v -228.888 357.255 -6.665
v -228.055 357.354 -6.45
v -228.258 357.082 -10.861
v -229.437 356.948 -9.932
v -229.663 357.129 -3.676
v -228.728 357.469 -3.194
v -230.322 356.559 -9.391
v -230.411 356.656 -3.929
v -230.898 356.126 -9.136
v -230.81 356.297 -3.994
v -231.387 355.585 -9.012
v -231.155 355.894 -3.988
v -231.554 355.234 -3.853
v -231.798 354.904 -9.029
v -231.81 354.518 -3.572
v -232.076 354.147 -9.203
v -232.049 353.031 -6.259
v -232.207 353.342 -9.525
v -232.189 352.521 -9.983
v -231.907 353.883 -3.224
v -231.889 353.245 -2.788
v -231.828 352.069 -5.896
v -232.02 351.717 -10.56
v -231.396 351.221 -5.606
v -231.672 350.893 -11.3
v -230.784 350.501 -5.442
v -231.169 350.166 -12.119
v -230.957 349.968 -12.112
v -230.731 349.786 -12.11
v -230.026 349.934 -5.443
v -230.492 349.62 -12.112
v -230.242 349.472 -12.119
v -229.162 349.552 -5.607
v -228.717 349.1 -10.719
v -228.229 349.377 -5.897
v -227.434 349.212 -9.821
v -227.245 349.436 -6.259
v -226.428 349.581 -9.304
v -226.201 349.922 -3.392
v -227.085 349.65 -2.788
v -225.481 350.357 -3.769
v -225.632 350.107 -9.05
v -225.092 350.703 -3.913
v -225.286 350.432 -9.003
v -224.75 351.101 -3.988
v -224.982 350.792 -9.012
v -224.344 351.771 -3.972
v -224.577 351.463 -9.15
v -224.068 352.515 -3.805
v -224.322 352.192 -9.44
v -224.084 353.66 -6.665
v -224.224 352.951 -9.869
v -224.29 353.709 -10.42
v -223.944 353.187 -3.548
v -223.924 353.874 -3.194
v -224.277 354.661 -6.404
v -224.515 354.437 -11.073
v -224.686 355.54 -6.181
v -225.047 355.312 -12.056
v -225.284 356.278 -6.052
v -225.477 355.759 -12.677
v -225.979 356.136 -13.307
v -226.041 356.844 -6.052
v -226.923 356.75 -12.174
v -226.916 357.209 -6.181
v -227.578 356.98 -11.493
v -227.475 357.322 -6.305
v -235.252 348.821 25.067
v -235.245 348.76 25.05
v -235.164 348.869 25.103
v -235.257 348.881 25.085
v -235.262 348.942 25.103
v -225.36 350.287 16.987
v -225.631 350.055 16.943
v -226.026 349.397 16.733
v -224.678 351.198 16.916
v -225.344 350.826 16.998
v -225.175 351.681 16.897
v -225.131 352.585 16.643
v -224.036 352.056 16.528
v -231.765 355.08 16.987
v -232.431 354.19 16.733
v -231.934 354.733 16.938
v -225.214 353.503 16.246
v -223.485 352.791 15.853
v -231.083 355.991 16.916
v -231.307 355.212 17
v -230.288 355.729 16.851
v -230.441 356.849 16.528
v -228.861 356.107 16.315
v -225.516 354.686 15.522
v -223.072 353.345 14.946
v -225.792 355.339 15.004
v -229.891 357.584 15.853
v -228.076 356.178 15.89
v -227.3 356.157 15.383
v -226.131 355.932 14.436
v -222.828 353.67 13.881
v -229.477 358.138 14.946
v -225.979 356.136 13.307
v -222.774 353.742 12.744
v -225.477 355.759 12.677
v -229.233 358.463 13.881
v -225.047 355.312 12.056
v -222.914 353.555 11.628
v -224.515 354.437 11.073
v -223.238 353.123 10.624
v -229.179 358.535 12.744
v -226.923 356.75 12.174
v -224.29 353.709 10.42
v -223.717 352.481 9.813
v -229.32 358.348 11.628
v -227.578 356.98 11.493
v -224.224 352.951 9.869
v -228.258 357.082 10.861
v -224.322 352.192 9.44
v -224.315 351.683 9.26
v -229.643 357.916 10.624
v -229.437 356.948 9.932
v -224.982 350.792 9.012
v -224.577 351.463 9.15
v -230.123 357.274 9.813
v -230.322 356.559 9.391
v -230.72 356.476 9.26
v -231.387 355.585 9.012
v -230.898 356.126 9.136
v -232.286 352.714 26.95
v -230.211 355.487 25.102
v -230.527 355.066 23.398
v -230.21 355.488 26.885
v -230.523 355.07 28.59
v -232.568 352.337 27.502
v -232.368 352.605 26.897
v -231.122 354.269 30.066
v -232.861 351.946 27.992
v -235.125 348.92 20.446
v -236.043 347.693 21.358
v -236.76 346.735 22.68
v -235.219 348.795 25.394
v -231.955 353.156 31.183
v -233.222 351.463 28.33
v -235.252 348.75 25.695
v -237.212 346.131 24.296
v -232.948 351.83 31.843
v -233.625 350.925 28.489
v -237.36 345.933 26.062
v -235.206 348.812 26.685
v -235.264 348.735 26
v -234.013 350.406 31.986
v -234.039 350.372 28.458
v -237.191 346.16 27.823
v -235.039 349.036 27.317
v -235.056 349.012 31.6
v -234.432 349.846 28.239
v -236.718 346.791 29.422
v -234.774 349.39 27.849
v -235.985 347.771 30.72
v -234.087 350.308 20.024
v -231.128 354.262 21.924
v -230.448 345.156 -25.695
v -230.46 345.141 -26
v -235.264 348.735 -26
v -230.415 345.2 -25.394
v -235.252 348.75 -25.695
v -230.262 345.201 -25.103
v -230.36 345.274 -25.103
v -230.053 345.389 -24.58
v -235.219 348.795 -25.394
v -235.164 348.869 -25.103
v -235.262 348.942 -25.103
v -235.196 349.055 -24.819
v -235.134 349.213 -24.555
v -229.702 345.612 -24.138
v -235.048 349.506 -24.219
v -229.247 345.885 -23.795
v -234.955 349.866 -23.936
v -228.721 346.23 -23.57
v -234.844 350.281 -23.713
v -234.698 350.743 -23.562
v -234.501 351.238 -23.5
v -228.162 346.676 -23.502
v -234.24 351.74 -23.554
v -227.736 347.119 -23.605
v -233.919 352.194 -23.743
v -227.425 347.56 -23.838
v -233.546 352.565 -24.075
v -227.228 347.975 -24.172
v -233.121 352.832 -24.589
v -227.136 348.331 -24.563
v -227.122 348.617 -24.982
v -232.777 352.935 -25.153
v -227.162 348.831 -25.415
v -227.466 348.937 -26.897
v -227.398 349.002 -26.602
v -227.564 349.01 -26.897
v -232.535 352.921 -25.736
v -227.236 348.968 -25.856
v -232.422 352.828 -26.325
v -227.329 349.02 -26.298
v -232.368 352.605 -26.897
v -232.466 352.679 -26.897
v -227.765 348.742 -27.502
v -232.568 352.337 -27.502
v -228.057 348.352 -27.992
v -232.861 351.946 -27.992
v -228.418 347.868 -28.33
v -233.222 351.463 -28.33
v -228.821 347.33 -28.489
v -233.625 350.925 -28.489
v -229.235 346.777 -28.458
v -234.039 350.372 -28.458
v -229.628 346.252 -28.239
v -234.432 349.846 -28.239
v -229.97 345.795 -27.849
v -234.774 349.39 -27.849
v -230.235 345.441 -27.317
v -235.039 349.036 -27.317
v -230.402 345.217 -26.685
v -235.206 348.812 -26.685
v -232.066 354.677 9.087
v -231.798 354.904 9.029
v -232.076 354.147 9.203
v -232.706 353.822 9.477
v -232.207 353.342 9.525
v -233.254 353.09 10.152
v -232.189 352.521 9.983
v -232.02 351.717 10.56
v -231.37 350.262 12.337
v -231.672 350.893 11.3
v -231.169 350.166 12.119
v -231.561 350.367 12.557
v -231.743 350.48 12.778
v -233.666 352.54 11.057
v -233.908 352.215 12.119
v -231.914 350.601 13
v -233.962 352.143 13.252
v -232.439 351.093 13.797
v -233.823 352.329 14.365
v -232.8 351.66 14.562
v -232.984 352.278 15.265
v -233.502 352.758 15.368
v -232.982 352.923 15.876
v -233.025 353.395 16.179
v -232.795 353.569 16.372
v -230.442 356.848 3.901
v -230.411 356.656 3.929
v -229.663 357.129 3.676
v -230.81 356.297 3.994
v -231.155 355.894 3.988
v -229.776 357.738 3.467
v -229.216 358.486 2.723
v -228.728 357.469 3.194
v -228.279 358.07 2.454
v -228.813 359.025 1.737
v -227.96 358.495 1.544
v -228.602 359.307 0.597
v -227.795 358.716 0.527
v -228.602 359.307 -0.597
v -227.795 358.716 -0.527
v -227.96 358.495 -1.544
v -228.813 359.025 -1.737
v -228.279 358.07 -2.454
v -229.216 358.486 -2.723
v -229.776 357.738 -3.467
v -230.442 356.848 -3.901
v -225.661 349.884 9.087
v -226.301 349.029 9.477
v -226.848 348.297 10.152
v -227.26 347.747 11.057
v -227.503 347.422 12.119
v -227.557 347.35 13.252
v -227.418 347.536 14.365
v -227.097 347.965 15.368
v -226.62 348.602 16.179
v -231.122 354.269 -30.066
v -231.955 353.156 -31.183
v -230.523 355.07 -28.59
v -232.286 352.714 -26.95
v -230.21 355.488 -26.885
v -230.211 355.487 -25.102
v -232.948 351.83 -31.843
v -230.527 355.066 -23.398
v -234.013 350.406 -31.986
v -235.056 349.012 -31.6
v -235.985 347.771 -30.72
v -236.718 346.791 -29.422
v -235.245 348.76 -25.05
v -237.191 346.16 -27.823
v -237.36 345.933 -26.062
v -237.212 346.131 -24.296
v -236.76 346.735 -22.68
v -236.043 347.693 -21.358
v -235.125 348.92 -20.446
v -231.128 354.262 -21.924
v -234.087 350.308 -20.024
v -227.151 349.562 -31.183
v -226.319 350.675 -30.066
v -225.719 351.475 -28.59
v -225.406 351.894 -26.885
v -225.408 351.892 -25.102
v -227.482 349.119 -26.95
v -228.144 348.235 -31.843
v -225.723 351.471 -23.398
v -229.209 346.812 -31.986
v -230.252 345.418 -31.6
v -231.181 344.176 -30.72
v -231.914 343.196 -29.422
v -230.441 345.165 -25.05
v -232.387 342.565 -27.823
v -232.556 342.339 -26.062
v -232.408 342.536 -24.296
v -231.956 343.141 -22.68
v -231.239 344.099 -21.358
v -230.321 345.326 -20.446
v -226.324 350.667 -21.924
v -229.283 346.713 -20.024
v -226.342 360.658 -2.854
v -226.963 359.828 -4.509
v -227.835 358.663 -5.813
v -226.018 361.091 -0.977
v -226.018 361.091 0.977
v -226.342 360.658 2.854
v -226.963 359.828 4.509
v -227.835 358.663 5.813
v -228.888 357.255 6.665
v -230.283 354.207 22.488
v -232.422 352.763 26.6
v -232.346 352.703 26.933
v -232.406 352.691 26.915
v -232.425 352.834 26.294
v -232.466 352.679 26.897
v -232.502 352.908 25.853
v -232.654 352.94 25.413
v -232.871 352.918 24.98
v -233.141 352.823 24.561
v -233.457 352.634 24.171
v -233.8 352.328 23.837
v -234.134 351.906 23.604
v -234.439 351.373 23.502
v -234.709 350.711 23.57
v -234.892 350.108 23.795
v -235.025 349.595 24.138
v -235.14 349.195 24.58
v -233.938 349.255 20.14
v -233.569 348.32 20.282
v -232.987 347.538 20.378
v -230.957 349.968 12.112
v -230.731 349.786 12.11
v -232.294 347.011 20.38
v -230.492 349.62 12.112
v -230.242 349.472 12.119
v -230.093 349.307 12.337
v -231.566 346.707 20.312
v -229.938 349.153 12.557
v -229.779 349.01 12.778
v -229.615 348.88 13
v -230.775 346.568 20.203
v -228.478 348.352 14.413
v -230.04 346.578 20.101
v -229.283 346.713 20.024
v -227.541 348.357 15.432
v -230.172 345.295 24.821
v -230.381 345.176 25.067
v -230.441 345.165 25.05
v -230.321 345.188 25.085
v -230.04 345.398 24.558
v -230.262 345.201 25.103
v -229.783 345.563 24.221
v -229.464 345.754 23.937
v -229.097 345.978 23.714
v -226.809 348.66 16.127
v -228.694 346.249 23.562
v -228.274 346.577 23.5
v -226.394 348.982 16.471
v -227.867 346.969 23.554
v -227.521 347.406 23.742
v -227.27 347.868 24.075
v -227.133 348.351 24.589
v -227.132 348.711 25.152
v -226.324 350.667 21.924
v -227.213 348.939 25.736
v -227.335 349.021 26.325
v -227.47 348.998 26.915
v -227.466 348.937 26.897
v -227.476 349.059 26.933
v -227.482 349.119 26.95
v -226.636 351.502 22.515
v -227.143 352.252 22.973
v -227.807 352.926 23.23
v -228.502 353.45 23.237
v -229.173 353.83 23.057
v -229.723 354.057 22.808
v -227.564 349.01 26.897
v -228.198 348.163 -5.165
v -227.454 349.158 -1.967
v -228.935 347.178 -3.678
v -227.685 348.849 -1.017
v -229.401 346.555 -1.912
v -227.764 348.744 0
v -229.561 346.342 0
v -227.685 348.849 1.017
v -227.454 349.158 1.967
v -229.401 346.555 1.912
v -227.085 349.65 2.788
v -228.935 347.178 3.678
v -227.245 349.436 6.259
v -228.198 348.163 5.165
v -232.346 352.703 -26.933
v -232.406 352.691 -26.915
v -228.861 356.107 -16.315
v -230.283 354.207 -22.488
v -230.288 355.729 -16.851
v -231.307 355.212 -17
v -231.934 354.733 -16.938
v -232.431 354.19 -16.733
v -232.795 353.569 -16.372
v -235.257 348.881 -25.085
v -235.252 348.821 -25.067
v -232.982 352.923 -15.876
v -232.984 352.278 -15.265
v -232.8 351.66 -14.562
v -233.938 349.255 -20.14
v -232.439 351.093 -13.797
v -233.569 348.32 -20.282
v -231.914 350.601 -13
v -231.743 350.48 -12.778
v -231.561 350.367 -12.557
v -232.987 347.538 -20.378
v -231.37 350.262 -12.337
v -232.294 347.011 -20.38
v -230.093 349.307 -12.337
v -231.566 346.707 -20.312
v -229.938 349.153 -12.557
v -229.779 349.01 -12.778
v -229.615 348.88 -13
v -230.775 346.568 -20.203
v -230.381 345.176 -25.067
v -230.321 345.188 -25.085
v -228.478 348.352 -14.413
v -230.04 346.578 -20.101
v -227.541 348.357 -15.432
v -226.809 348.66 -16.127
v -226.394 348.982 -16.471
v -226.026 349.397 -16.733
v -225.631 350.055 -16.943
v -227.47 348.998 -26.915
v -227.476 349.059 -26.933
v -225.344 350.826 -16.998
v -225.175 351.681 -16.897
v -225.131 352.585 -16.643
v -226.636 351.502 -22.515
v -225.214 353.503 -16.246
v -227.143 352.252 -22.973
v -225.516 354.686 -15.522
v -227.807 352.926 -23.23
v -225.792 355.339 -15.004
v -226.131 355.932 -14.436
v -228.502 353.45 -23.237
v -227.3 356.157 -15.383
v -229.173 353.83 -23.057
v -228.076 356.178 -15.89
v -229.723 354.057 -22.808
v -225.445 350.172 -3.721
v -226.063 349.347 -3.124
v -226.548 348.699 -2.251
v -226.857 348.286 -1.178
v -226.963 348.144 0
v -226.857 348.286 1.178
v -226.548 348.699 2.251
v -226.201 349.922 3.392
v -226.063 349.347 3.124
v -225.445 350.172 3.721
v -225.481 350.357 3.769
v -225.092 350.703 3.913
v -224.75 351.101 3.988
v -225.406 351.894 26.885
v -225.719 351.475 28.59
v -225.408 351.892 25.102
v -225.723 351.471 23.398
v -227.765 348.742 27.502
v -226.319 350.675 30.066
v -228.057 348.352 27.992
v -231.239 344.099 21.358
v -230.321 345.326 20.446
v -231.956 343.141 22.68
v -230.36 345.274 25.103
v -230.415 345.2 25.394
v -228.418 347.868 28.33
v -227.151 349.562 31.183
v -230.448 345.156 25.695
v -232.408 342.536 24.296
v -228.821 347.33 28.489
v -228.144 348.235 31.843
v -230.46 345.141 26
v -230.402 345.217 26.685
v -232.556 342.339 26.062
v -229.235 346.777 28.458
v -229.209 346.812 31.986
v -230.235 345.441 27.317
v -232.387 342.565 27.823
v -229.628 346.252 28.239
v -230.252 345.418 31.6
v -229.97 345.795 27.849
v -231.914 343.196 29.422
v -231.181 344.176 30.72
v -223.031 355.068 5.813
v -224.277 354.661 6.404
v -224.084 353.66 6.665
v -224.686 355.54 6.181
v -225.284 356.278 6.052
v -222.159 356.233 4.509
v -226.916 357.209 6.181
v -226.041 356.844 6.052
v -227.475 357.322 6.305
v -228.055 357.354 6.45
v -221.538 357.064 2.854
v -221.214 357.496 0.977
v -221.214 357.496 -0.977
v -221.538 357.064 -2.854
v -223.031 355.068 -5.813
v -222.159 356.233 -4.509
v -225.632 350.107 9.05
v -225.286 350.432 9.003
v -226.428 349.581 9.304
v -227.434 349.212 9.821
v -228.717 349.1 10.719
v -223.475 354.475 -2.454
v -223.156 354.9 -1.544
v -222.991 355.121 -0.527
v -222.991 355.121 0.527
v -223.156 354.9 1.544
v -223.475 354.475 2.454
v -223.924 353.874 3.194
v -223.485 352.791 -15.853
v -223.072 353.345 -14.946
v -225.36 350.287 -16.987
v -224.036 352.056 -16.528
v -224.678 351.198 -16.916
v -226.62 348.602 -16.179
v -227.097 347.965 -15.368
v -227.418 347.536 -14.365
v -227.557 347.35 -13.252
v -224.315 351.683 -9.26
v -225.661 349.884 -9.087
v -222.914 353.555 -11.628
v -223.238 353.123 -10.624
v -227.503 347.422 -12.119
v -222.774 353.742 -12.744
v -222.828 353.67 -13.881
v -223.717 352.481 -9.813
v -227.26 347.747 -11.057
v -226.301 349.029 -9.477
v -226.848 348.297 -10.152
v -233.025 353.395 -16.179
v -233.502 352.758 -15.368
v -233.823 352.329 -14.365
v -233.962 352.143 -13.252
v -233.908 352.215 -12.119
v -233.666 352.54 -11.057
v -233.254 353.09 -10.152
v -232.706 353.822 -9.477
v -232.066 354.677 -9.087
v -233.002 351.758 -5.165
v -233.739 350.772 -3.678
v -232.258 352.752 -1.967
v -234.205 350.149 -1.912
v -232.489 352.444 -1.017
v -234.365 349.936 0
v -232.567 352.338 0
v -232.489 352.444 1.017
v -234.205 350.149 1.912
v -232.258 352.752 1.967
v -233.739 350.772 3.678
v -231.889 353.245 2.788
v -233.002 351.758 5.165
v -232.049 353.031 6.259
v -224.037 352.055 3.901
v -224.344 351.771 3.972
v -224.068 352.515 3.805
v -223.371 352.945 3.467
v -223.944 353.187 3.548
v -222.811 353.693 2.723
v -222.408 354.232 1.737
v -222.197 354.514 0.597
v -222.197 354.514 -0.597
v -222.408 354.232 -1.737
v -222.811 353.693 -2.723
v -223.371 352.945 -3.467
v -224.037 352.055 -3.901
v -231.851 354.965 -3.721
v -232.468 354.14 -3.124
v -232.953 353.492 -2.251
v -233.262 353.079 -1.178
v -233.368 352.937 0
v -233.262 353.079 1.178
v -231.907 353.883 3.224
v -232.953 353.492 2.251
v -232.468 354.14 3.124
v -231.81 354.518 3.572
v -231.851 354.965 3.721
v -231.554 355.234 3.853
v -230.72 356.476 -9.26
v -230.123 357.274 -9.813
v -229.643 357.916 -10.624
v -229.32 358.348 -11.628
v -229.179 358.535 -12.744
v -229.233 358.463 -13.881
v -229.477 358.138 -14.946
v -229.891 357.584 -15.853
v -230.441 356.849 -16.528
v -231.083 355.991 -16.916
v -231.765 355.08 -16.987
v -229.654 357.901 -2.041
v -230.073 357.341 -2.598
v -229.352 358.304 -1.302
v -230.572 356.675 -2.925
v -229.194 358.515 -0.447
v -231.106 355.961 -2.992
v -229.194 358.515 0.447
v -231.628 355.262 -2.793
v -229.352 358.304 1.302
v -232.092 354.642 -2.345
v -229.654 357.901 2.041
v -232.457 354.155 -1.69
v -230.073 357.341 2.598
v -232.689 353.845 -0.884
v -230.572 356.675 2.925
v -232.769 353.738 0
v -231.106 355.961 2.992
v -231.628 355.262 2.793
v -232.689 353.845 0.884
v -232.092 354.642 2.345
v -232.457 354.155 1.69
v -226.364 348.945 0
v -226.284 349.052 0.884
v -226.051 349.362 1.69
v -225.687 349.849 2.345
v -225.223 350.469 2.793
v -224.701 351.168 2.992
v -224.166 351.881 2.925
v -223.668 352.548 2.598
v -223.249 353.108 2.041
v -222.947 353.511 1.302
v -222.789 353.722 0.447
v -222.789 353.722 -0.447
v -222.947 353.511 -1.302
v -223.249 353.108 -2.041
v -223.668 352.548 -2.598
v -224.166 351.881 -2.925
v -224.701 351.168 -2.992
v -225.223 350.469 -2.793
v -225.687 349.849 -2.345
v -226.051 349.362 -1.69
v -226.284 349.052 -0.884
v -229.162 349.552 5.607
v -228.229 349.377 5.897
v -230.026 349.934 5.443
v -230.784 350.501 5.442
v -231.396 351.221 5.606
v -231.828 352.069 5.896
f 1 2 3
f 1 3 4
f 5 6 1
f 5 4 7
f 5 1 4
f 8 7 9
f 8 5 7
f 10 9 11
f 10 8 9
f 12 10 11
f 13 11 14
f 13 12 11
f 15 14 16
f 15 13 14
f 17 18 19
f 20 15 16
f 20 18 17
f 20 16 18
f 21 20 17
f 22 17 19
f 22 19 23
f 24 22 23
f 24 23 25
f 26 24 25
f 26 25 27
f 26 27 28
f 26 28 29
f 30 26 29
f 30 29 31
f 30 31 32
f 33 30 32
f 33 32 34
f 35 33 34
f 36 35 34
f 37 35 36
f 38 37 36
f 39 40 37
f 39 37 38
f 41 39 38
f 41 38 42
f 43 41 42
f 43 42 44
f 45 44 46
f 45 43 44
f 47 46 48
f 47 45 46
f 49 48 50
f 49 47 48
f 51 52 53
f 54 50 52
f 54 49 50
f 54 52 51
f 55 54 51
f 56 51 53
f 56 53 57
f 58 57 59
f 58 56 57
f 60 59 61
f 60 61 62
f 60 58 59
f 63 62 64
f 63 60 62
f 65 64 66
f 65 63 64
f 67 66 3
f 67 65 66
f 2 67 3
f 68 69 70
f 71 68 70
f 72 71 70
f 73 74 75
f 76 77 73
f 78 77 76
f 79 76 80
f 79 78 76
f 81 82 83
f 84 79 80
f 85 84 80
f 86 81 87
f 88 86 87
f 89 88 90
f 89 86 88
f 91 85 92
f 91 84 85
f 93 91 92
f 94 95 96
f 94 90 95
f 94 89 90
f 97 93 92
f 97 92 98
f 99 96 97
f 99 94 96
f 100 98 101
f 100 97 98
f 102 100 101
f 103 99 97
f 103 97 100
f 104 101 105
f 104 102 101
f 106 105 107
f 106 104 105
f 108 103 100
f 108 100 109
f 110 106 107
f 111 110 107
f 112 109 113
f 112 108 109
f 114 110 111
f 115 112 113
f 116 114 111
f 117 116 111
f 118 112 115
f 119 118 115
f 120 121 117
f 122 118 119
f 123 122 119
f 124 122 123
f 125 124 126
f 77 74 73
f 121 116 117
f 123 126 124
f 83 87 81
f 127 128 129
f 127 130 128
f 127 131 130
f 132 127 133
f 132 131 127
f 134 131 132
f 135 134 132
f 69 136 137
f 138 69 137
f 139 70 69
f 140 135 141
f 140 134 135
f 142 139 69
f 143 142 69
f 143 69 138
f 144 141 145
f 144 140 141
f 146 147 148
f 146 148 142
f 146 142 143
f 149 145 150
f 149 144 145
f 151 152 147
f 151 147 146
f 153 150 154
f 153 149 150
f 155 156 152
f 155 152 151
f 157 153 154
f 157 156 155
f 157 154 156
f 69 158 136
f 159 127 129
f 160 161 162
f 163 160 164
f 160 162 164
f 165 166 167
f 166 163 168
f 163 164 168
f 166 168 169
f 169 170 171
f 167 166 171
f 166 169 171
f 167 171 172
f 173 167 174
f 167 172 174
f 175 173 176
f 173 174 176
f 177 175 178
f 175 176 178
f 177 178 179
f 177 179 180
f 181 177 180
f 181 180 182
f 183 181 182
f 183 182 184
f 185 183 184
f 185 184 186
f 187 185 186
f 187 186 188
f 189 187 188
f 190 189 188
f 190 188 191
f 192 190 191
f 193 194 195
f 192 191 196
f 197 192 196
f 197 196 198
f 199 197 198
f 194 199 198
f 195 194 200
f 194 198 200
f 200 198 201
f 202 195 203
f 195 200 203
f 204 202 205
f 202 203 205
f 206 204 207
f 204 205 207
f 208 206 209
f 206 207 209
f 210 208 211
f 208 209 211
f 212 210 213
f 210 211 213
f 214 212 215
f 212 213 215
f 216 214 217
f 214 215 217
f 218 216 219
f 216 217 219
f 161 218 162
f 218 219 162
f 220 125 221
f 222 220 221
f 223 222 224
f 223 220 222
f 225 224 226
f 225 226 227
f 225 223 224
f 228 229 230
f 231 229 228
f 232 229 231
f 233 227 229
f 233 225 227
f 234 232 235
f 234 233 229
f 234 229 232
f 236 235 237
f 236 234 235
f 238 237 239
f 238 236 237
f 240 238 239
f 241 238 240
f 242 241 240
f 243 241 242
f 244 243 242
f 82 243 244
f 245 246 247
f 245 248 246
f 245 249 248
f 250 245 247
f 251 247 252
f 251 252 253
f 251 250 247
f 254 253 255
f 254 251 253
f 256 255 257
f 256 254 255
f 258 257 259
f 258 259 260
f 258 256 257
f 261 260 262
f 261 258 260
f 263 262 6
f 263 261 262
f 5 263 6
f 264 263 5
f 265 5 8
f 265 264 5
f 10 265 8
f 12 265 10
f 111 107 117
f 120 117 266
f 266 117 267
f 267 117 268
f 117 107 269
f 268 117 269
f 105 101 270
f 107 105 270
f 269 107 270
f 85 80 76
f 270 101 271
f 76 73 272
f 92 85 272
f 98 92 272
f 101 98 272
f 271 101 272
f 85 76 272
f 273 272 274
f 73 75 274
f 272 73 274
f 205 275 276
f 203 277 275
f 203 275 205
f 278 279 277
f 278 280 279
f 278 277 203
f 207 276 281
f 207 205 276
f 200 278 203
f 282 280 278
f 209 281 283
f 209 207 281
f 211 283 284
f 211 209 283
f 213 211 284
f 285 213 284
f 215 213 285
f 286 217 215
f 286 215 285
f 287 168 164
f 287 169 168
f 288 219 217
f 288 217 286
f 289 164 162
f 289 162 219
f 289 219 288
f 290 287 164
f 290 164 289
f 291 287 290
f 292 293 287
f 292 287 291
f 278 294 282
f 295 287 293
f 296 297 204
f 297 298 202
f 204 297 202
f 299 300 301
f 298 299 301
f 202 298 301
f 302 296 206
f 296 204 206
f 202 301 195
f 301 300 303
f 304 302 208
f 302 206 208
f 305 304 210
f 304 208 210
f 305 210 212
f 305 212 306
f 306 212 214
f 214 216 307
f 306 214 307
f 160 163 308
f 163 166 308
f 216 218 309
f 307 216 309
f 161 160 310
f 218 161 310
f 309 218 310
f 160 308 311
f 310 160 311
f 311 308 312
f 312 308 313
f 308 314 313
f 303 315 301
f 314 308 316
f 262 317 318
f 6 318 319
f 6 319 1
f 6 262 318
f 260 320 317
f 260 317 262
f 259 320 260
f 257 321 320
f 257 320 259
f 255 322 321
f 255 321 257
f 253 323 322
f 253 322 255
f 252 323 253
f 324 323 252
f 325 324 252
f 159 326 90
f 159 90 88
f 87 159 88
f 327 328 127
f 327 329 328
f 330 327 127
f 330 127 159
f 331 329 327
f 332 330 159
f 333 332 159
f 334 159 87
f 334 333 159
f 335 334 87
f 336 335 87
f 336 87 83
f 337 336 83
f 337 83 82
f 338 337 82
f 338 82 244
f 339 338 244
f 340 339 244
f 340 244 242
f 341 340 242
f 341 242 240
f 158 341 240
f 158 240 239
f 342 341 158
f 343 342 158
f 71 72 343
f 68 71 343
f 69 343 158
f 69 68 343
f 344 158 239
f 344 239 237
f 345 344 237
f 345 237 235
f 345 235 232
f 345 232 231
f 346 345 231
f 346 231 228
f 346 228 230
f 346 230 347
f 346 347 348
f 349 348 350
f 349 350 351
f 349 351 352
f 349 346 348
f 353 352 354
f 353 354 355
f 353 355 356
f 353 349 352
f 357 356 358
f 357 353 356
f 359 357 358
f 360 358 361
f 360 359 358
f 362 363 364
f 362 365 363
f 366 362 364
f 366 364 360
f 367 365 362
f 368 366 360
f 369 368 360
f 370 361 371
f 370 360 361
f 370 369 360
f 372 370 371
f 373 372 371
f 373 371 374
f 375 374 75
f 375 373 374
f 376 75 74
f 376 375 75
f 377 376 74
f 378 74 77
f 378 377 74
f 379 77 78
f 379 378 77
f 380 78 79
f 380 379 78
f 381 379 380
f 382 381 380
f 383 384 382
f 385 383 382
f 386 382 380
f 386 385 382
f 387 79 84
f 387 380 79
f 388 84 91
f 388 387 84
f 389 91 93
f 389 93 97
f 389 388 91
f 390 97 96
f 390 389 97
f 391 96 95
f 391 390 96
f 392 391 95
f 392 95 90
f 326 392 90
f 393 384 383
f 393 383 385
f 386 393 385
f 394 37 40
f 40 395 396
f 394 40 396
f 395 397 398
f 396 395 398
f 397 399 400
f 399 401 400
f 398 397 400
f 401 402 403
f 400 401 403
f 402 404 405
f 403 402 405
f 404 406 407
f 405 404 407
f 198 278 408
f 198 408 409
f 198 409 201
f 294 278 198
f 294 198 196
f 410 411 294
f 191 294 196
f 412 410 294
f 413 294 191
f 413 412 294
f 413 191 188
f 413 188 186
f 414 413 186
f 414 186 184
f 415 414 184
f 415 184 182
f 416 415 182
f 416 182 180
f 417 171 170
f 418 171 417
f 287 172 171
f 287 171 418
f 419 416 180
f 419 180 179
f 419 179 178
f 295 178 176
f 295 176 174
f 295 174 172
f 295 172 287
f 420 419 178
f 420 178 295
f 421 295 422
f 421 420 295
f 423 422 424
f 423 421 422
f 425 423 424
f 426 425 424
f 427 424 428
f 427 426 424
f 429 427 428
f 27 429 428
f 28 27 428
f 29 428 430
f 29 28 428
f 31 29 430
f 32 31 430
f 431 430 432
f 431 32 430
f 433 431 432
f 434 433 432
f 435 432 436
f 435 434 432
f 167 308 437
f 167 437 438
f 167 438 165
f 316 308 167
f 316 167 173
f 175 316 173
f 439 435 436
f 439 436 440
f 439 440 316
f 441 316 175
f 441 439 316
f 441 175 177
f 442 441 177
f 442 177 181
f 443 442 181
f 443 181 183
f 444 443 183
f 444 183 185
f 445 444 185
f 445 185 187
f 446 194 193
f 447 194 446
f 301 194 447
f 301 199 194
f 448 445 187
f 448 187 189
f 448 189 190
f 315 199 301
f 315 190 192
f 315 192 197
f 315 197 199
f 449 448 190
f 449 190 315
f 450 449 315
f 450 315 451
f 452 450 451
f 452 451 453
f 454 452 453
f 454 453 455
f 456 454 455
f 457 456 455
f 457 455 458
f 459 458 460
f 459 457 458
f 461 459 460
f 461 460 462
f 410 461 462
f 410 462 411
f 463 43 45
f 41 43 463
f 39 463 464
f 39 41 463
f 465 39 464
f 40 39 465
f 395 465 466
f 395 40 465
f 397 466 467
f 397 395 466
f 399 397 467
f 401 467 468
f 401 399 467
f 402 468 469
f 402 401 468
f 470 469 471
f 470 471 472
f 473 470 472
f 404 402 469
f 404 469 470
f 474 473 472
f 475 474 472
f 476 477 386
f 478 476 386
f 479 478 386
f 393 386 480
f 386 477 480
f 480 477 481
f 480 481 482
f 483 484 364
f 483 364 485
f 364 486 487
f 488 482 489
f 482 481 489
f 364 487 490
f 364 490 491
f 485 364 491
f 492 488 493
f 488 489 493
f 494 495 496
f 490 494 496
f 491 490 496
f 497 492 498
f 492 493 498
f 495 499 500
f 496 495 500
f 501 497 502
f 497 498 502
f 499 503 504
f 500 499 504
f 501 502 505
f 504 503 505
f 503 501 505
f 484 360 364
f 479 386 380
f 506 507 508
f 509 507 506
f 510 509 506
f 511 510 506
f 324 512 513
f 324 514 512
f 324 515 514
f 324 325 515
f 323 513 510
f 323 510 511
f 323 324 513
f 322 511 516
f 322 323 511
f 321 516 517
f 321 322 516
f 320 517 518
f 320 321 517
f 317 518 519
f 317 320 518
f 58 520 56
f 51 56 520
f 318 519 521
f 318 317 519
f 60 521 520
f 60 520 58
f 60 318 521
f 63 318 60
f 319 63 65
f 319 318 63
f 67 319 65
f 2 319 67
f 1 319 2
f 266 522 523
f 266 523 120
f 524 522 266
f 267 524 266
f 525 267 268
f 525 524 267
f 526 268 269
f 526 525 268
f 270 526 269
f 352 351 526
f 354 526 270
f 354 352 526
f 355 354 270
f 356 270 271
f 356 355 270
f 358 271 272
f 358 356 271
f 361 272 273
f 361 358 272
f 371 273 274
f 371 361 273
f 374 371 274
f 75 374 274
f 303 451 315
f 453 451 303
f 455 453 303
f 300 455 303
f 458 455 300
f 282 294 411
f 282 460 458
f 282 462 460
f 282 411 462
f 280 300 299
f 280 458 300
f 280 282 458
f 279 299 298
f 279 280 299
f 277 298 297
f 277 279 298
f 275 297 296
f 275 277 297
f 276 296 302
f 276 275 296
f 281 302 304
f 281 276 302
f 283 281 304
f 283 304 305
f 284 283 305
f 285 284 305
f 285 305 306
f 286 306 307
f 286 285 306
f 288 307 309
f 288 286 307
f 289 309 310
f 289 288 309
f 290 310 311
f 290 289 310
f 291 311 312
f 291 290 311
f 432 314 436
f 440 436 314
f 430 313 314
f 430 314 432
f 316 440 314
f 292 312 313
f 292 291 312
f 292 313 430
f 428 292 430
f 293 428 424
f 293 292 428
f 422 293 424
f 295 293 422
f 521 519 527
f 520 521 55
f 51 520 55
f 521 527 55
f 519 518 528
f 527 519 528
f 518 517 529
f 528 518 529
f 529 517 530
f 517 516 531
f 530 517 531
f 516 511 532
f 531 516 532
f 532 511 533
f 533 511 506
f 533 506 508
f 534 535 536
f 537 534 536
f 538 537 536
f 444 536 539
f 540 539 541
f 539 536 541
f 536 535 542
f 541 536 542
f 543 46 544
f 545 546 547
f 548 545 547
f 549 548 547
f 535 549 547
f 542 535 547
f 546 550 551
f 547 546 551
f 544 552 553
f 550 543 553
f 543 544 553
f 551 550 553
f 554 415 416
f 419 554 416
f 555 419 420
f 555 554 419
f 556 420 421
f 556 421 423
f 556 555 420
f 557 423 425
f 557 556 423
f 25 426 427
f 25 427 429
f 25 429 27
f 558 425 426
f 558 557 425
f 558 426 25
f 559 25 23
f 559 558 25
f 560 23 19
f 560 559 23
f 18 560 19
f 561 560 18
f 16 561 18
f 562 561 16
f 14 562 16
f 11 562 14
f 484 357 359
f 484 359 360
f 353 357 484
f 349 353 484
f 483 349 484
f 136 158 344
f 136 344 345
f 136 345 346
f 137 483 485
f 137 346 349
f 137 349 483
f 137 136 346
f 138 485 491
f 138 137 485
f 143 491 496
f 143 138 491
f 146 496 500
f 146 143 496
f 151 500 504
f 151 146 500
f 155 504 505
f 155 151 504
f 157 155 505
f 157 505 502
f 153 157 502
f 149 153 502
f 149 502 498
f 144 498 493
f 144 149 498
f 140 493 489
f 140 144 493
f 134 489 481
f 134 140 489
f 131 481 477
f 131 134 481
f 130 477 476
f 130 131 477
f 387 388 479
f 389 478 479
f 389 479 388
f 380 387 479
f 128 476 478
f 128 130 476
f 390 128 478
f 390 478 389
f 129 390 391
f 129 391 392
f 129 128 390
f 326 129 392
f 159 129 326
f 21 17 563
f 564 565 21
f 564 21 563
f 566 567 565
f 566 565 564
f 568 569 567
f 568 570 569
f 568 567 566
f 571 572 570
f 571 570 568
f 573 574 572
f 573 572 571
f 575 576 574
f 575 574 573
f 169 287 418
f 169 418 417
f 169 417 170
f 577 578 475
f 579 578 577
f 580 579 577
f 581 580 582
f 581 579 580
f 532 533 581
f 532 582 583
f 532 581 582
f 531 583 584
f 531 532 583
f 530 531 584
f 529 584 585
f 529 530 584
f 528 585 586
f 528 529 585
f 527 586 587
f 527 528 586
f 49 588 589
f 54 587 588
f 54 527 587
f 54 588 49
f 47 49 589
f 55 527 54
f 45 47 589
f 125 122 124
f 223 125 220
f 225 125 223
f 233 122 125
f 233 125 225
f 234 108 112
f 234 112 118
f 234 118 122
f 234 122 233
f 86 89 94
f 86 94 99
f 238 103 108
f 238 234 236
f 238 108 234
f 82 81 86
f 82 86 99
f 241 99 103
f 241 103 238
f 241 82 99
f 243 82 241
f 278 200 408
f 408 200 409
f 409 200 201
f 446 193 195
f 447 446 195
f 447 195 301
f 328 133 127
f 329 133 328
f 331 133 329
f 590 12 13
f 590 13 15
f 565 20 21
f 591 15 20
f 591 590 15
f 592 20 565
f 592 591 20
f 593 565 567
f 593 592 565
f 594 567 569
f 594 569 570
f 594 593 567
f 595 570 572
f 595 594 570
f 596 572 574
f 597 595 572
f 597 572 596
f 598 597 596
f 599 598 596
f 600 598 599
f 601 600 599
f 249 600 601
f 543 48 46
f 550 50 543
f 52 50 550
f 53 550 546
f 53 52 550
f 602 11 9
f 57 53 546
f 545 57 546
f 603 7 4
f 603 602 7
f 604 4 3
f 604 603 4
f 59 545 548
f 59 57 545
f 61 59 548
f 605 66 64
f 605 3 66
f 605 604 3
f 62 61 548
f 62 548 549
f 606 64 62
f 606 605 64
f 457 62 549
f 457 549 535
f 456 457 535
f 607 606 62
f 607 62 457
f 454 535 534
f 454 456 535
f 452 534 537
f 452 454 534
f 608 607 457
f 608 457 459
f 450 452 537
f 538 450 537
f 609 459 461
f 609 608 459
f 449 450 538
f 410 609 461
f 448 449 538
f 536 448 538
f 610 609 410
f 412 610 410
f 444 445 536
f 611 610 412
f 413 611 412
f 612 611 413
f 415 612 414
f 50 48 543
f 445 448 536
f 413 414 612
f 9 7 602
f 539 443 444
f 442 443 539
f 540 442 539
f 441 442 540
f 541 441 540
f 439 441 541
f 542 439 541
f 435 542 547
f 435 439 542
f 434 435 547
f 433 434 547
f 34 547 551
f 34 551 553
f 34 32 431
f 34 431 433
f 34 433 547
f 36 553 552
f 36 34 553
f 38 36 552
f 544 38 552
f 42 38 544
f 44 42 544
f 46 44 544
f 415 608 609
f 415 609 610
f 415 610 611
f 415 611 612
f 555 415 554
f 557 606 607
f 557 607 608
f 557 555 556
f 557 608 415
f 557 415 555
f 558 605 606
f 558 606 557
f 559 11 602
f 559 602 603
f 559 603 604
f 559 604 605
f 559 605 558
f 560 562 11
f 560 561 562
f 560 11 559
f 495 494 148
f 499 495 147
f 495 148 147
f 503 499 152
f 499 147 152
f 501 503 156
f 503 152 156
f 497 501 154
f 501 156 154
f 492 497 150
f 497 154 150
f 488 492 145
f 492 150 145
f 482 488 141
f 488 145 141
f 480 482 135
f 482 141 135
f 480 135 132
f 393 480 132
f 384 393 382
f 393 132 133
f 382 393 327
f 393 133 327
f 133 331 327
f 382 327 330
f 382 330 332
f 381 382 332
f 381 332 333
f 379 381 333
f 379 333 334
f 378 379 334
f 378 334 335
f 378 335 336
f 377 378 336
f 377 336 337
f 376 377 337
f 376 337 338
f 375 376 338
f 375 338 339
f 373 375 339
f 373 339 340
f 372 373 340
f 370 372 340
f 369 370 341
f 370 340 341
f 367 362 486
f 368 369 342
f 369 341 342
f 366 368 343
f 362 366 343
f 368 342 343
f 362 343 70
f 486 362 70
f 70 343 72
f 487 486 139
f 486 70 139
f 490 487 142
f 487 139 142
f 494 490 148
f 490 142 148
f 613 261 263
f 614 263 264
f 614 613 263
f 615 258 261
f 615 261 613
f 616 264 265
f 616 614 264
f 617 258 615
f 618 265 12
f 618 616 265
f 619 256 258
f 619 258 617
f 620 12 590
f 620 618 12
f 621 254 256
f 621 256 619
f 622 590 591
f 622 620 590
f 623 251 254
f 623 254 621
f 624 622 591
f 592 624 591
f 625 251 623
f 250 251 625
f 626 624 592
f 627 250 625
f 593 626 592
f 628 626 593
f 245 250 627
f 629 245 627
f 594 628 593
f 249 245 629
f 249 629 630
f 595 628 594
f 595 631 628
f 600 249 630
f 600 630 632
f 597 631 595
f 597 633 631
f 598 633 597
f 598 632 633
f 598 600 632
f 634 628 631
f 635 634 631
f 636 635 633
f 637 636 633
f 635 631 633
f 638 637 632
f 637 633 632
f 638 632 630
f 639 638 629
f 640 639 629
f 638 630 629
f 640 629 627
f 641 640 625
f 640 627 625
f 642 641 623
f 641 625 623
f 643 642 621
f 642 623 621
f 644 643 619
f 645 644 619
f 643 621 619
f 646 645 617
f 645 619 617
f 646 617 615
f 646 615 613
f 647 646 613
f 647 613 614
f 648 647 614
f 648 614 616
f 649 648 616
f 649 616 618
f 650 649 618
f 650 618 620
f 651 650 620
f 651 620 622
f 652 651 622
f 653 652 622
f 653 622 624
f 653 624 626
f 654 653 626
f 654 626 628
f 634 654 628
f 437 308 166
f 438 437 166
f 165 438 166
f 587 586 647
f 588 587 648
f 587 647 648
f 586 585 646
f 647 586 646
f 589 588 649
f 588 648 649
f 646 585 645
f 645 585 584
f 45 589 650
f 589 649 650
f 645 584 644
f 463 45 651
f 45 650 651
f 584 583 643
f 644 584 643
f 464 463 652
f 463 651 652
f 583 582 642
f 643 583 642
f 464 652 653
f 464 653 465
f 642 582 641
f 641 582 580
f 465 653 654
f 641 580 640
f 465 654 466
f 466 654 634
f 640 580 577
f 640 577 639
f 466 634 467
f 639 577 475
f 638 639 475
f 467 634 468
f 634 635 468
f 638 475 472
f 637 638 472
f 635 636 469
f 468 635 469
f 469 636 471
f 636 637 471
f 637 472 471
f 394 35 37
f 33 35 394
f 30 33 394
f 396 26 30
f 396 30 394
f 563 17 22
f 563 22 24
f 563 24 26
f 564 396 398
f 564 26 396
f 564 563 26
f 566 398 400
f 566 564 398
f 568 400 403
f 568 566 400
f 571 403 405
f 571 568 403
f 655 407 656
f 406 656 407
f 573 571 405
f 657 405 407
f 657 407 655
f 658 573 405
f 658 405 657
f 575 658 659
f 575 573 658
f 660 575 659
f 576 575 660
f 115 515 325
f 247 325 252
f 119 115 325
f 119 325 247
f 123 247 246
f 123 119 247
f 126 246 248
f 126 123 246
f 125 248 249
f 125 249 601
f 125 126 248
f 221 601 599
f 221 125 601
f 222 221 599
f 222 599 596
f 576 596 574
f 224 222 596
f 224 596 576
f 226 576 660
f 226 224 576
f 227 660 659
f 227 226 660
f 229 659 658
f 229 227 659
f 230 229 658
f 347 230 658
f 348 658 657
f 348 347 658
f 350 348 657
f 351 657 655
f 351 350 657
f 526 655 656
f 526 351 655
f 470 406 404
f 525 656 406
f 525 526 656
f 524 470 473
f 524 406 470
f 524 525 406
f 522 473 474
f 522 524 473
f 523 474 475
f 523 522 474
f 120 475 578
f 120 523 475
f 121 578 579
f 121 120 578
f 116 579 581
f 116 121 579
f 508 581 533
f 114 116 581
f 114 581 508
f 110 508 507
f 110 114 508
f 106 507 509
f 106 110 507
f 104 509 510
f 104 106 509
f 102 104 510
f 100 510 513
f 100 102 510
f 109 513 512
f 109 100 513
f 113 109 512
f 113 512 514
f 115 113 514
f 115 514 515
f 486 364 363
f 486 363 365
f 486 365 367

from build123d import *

# Parameters (mm, degrees)
ARCO_1_PROFILE_R           = 4
ARCO_2_PROFILE_R           = 4
ARCO_3_PROFILE_R           = 4
ARCO_4_PROFILE_R           = 4
ARCO_CODO_1_PROFILE_R      = 4
ARCO_CODO_2_PROFILE_R      = 4
ARCO_CODO_3_PROFILE_R      = 4
BOSS_IZQ_PROFILE_R         = 6
BOSS_DCHO_PROFILE_R        = 6
BOSS_CENTRO_PROFILE_R      = 7
PIVOTE_IZQ_PROFILE_R       = 2.5
PIVOTE_DCHO_PROFILE_R      = 2.5
TALADRO_TORNILLO_PROFILE_R = 3


with BuildPart() as part:
    # Arco_1: sweep along a curve in space
    with BuildLine() as arco_1_path:
        Line((-231.363734357, 348.939584198, -26), (-228.368101152, 352.942855573, -13))
    # Arco_1 profile (on start of the path) → Arco_1 (sweep)
    with BuildSketch(Plane(origin=(-231.363734357, 348.939584198, -26), x_dir=(0, 0.9557113836787837, -0.29430554039430606), z_dir=(0.215073929957754, 0.28741813449044995, 0.9333456062030596))):
        Circle(ARCO_1_PROFILE_R)
    sweep(path=arco_1_path.line)

    # Arco_2: sweep along a curve in space
    with BuildLine() as arco_2_path:
        Line((-228.368101152, 352.942855573, -13), (-227.768974511, 353.743509848, 0))
    # Arco_2 profile (on start of the path) → Arco_2 (sweep)
    with BuildSketch(Plane(origin=(-228.368101152, 352.942855573, -13), x_dir=(0, 0.9981087890283697, -0.06147231298984599), z_dir=(0.04595091574946005, 0.06140737971093147, 0.9970544855015816))):
        Circle(ARCO_2_PROFILE_R)
    sweep(path=arco_2_path.line)

    # Arco_3: sweep along a curve in space
    with BuildLine() as arco_3_path:
        Line((-227.768974511, 353.743509848, 0), (-228.368101152, 352.942855573, 13))
    # Arco_3 profile (on start of the path) → Arco_3 (sweep)
    with BuildSketch(Plane(origin=(-227.768974511, 353.743509848, 0), x_dir=(0, 0.9981087890283697, 0.06147231298984599), z_dir=(-0.04595091574946005, -0.06140737971093147, 0.9970544855015816))):
        Circle(ARCO_3_PROFILE_R)
    sweep(path=arco_3_path.line)

    # Arco_4: sweep along a curve in space
    with BuildLine() as arco_4_path:
        Line((-228.368101152, 352.942855573, 13), (-231.363734357, 348.939584198, 26))
    # Arco_4 profile (on start of the path) → Arco_4 (sweep)
    with BuildSketch(Plane(origin=(-228.368101152, 352.942855573, 13), x_dir=(0, 0.9557113836787837, 0.29430554039430606), z_dir=(-0.215073929957754, -0.28741813449044995, 0.9333456062030596))):
        Circle(ARCO_4_PROFILE_R)
    sweep(path=arco_4_path.line)

    # Arco_codo_1: sweep along a curve in space
    with BuildLine() as arco_codo_1_path:
        Line((-225.165484052, 350.546349009, -13), (-231.570718252, 355.339362137, -13))
    # Arco_codo_1 profile (on start of the path) → Arco_codo_1 (sweep)
    with BuildSketch(Plane(origin=(-225.165484052, 350.546349009, -13), x_dir=(-0.5991266409502999, -0.8006542750173826, 0), z_dir=(-0.8006542750173826, 0.5991266409502999, 0))):
        Circle(ARCO_CODO_1_PROFILE_R)
    sweep(path=arco_codo_1_path.line)

    # Arco_codo_2: sweep along a curve in space
    with BuildLine() as arco_codo_2_path:
        Line((-224.566357411, 351.347003284, 0), (-230.971591611, 356.140016412, 0))
    # Arco_codo_2 profile (on start of the path) → Arco_codo_2 (sweep)
    with BuildSketch(Plane(origin=(-224.566357411, 351.347003284, 0), x_dir=(-0.5991266409502999, -0.8006542750173826, 0), z_dir=(-0.8006542750173826, 0.5991266409502999, 0))):
        Circle(ARCO_CODO_2_PROFILE_R)
    sweep(path=arco_codo_2_path.line)

    # Arco_codo_3: sweep along a curve in space
    with BuildLine() as arco_codo_3_path:
        Line((-225.165484052, 350.546349009, 13), (-231.570718252, 355.339362137, 13))
    # Arco_codo_3 profile (on start of the path) → Arco_codo_3 (sweep)
    with BuildSketch(Plane(origin=(-225.165484052, 350.546349009, 13), x_dir=(-0.5991266409502999, -0.8006542750173826, 0), z_dir=(-0.8006542750173826, 0.5991266409502999, 0))):
        Circle(ARCO_CODO_3_PROFILE_R)
    sweep(path=arco_codo_3_path.line)

    # Boss_izq: sweep along a curve in space
    with BuildLine() as boss_izq_path:
        Line((-228.961771531, 347.142204275, -26), (-233.765697182, 350.736964121, -26))
    # Boss_izq profile (on start of the path) → Boss_izq (sweep)
    with BuildSketch(Plane(origin=(-228.961771531, 347.142204275, -26), x_dir=(-0.5991266409502979, -0.8006542750173841, 0), z_dir=(-0.8006542750173841, 0.5991266409502979, 0))):
        Circle(BOSS_IZQ_PROFILE_R)
    sweep(path=boss_izq_path.line)

    # Boss_dcho: sweep along a curve in space
    with BuildLine() as boss_dcho_path:
        Line((-228.961771531, 347.142204275, 26), (-233.765697182, 350.736964121, 26))
    # Boss_dcho profile (on start of the path) → Boss_dcho (sweep)
    with BuildSketch(Plane(origin=(-228.961771531, 347.142204275, 26), x_dir=(-0.5991266409502979, -0.8006542750173841, 0), z_dir=(-0.8006542750173841, 0.5991266409502979, 0))):
        Circle(BOSS_DCHO_PROFILE_R)
    sweep(path=boss_dcho_path.line)

    # Boss_centro: sweep along a curve in space
    with BuildLine() as boss_centro_path:
        Line((-225.367011686, 351.946129925, 0), (-230.170937336, 355.540889771, 0))
    # Boss_centro profile (on start of the path) → Boss_centro (sweep)
    with BuildSketch(Plane(origin=(-225.367011686, 351.946129925, 0), x_dir=(-0.5991266409502979, -0.8006542750173841, 0), z_dir=(-0.8006542750173841, 0.5991266409502979, 0))):
        Circle(BOSS_CENTRO_PROFILE_R)
    sweep(path=boss_centro_path.line)

    # Pivote_izq: sweep along a curve in space
    with BuildLine() as pivote_izq_path:
        Line((-228.161117256, 346.543077634, -26), (-234.566351457, 351.336090762, -26))
    # Pivote_izq profile (on start of the path) → Pivote_izq (sweep, cut)
    with BuildSketch(Plane(origin=(-228.161117256, 346.543077634, -26), x_dir=(-0.5991266409502999, -0.8006542750173826, 0), z_dir=(-0.8006542750173826, 0.5991266409502999, 0))):
        Circle(PIVOTE_IZQ_PROFILE_R)
    sweep(path=pivote_izq_path.line, mode=Mode.SUBTRACT)

    # Pivote_dcho: sweep along a curve in space
    with BuildLine() as pivote_dcho_path:
        Line((-228.161117256, 346.543077634, 26), (-234.566351457, 351.336090762, 26))
    # Pivote_dcho profile (on start of the path) → Pivote_dcho (sweep, cut)
    with BuildSketch(Plane(origin=(-228.161117256, 346.543077634, 26), x_dir=(-0.5991266409502999, -0.8006542750173826, 0), z_dir=(-0.8006542750173826, 0.5991266409502999, 0))):
        Circle(PIVOTE_DCHO_PROFILE_R)
    sweep(path=pivote_dcho_path.line, mode=Mode.SUBTRACT)

    # Taladro_tornillo: sweep along a curve in space
    with BuildLine() as taladro_tornillo_path:
        Line((-224.566357411, 351.347003284, 0), (-230.971591611, 356.140016412, 0))
    # Taladro_tornillo profile (on start of the path) → Taladro_tornillo (sweep, cut)
    with BuildSketch(Plane(origin=(-224.566357411, 351.347003284, 0), x_dir=(-0.5991266409502999, -0.8006542750173826, 0), z_dir=(-0.8006542750173826, 0.5991266409502999, 0))):
        Circle(TALADRO_TORNILLO_PROFILE_R)
    sweep(path=taladro_tornillo_path.line, mode=Mode.SUBTRACT)


solid = part.part
